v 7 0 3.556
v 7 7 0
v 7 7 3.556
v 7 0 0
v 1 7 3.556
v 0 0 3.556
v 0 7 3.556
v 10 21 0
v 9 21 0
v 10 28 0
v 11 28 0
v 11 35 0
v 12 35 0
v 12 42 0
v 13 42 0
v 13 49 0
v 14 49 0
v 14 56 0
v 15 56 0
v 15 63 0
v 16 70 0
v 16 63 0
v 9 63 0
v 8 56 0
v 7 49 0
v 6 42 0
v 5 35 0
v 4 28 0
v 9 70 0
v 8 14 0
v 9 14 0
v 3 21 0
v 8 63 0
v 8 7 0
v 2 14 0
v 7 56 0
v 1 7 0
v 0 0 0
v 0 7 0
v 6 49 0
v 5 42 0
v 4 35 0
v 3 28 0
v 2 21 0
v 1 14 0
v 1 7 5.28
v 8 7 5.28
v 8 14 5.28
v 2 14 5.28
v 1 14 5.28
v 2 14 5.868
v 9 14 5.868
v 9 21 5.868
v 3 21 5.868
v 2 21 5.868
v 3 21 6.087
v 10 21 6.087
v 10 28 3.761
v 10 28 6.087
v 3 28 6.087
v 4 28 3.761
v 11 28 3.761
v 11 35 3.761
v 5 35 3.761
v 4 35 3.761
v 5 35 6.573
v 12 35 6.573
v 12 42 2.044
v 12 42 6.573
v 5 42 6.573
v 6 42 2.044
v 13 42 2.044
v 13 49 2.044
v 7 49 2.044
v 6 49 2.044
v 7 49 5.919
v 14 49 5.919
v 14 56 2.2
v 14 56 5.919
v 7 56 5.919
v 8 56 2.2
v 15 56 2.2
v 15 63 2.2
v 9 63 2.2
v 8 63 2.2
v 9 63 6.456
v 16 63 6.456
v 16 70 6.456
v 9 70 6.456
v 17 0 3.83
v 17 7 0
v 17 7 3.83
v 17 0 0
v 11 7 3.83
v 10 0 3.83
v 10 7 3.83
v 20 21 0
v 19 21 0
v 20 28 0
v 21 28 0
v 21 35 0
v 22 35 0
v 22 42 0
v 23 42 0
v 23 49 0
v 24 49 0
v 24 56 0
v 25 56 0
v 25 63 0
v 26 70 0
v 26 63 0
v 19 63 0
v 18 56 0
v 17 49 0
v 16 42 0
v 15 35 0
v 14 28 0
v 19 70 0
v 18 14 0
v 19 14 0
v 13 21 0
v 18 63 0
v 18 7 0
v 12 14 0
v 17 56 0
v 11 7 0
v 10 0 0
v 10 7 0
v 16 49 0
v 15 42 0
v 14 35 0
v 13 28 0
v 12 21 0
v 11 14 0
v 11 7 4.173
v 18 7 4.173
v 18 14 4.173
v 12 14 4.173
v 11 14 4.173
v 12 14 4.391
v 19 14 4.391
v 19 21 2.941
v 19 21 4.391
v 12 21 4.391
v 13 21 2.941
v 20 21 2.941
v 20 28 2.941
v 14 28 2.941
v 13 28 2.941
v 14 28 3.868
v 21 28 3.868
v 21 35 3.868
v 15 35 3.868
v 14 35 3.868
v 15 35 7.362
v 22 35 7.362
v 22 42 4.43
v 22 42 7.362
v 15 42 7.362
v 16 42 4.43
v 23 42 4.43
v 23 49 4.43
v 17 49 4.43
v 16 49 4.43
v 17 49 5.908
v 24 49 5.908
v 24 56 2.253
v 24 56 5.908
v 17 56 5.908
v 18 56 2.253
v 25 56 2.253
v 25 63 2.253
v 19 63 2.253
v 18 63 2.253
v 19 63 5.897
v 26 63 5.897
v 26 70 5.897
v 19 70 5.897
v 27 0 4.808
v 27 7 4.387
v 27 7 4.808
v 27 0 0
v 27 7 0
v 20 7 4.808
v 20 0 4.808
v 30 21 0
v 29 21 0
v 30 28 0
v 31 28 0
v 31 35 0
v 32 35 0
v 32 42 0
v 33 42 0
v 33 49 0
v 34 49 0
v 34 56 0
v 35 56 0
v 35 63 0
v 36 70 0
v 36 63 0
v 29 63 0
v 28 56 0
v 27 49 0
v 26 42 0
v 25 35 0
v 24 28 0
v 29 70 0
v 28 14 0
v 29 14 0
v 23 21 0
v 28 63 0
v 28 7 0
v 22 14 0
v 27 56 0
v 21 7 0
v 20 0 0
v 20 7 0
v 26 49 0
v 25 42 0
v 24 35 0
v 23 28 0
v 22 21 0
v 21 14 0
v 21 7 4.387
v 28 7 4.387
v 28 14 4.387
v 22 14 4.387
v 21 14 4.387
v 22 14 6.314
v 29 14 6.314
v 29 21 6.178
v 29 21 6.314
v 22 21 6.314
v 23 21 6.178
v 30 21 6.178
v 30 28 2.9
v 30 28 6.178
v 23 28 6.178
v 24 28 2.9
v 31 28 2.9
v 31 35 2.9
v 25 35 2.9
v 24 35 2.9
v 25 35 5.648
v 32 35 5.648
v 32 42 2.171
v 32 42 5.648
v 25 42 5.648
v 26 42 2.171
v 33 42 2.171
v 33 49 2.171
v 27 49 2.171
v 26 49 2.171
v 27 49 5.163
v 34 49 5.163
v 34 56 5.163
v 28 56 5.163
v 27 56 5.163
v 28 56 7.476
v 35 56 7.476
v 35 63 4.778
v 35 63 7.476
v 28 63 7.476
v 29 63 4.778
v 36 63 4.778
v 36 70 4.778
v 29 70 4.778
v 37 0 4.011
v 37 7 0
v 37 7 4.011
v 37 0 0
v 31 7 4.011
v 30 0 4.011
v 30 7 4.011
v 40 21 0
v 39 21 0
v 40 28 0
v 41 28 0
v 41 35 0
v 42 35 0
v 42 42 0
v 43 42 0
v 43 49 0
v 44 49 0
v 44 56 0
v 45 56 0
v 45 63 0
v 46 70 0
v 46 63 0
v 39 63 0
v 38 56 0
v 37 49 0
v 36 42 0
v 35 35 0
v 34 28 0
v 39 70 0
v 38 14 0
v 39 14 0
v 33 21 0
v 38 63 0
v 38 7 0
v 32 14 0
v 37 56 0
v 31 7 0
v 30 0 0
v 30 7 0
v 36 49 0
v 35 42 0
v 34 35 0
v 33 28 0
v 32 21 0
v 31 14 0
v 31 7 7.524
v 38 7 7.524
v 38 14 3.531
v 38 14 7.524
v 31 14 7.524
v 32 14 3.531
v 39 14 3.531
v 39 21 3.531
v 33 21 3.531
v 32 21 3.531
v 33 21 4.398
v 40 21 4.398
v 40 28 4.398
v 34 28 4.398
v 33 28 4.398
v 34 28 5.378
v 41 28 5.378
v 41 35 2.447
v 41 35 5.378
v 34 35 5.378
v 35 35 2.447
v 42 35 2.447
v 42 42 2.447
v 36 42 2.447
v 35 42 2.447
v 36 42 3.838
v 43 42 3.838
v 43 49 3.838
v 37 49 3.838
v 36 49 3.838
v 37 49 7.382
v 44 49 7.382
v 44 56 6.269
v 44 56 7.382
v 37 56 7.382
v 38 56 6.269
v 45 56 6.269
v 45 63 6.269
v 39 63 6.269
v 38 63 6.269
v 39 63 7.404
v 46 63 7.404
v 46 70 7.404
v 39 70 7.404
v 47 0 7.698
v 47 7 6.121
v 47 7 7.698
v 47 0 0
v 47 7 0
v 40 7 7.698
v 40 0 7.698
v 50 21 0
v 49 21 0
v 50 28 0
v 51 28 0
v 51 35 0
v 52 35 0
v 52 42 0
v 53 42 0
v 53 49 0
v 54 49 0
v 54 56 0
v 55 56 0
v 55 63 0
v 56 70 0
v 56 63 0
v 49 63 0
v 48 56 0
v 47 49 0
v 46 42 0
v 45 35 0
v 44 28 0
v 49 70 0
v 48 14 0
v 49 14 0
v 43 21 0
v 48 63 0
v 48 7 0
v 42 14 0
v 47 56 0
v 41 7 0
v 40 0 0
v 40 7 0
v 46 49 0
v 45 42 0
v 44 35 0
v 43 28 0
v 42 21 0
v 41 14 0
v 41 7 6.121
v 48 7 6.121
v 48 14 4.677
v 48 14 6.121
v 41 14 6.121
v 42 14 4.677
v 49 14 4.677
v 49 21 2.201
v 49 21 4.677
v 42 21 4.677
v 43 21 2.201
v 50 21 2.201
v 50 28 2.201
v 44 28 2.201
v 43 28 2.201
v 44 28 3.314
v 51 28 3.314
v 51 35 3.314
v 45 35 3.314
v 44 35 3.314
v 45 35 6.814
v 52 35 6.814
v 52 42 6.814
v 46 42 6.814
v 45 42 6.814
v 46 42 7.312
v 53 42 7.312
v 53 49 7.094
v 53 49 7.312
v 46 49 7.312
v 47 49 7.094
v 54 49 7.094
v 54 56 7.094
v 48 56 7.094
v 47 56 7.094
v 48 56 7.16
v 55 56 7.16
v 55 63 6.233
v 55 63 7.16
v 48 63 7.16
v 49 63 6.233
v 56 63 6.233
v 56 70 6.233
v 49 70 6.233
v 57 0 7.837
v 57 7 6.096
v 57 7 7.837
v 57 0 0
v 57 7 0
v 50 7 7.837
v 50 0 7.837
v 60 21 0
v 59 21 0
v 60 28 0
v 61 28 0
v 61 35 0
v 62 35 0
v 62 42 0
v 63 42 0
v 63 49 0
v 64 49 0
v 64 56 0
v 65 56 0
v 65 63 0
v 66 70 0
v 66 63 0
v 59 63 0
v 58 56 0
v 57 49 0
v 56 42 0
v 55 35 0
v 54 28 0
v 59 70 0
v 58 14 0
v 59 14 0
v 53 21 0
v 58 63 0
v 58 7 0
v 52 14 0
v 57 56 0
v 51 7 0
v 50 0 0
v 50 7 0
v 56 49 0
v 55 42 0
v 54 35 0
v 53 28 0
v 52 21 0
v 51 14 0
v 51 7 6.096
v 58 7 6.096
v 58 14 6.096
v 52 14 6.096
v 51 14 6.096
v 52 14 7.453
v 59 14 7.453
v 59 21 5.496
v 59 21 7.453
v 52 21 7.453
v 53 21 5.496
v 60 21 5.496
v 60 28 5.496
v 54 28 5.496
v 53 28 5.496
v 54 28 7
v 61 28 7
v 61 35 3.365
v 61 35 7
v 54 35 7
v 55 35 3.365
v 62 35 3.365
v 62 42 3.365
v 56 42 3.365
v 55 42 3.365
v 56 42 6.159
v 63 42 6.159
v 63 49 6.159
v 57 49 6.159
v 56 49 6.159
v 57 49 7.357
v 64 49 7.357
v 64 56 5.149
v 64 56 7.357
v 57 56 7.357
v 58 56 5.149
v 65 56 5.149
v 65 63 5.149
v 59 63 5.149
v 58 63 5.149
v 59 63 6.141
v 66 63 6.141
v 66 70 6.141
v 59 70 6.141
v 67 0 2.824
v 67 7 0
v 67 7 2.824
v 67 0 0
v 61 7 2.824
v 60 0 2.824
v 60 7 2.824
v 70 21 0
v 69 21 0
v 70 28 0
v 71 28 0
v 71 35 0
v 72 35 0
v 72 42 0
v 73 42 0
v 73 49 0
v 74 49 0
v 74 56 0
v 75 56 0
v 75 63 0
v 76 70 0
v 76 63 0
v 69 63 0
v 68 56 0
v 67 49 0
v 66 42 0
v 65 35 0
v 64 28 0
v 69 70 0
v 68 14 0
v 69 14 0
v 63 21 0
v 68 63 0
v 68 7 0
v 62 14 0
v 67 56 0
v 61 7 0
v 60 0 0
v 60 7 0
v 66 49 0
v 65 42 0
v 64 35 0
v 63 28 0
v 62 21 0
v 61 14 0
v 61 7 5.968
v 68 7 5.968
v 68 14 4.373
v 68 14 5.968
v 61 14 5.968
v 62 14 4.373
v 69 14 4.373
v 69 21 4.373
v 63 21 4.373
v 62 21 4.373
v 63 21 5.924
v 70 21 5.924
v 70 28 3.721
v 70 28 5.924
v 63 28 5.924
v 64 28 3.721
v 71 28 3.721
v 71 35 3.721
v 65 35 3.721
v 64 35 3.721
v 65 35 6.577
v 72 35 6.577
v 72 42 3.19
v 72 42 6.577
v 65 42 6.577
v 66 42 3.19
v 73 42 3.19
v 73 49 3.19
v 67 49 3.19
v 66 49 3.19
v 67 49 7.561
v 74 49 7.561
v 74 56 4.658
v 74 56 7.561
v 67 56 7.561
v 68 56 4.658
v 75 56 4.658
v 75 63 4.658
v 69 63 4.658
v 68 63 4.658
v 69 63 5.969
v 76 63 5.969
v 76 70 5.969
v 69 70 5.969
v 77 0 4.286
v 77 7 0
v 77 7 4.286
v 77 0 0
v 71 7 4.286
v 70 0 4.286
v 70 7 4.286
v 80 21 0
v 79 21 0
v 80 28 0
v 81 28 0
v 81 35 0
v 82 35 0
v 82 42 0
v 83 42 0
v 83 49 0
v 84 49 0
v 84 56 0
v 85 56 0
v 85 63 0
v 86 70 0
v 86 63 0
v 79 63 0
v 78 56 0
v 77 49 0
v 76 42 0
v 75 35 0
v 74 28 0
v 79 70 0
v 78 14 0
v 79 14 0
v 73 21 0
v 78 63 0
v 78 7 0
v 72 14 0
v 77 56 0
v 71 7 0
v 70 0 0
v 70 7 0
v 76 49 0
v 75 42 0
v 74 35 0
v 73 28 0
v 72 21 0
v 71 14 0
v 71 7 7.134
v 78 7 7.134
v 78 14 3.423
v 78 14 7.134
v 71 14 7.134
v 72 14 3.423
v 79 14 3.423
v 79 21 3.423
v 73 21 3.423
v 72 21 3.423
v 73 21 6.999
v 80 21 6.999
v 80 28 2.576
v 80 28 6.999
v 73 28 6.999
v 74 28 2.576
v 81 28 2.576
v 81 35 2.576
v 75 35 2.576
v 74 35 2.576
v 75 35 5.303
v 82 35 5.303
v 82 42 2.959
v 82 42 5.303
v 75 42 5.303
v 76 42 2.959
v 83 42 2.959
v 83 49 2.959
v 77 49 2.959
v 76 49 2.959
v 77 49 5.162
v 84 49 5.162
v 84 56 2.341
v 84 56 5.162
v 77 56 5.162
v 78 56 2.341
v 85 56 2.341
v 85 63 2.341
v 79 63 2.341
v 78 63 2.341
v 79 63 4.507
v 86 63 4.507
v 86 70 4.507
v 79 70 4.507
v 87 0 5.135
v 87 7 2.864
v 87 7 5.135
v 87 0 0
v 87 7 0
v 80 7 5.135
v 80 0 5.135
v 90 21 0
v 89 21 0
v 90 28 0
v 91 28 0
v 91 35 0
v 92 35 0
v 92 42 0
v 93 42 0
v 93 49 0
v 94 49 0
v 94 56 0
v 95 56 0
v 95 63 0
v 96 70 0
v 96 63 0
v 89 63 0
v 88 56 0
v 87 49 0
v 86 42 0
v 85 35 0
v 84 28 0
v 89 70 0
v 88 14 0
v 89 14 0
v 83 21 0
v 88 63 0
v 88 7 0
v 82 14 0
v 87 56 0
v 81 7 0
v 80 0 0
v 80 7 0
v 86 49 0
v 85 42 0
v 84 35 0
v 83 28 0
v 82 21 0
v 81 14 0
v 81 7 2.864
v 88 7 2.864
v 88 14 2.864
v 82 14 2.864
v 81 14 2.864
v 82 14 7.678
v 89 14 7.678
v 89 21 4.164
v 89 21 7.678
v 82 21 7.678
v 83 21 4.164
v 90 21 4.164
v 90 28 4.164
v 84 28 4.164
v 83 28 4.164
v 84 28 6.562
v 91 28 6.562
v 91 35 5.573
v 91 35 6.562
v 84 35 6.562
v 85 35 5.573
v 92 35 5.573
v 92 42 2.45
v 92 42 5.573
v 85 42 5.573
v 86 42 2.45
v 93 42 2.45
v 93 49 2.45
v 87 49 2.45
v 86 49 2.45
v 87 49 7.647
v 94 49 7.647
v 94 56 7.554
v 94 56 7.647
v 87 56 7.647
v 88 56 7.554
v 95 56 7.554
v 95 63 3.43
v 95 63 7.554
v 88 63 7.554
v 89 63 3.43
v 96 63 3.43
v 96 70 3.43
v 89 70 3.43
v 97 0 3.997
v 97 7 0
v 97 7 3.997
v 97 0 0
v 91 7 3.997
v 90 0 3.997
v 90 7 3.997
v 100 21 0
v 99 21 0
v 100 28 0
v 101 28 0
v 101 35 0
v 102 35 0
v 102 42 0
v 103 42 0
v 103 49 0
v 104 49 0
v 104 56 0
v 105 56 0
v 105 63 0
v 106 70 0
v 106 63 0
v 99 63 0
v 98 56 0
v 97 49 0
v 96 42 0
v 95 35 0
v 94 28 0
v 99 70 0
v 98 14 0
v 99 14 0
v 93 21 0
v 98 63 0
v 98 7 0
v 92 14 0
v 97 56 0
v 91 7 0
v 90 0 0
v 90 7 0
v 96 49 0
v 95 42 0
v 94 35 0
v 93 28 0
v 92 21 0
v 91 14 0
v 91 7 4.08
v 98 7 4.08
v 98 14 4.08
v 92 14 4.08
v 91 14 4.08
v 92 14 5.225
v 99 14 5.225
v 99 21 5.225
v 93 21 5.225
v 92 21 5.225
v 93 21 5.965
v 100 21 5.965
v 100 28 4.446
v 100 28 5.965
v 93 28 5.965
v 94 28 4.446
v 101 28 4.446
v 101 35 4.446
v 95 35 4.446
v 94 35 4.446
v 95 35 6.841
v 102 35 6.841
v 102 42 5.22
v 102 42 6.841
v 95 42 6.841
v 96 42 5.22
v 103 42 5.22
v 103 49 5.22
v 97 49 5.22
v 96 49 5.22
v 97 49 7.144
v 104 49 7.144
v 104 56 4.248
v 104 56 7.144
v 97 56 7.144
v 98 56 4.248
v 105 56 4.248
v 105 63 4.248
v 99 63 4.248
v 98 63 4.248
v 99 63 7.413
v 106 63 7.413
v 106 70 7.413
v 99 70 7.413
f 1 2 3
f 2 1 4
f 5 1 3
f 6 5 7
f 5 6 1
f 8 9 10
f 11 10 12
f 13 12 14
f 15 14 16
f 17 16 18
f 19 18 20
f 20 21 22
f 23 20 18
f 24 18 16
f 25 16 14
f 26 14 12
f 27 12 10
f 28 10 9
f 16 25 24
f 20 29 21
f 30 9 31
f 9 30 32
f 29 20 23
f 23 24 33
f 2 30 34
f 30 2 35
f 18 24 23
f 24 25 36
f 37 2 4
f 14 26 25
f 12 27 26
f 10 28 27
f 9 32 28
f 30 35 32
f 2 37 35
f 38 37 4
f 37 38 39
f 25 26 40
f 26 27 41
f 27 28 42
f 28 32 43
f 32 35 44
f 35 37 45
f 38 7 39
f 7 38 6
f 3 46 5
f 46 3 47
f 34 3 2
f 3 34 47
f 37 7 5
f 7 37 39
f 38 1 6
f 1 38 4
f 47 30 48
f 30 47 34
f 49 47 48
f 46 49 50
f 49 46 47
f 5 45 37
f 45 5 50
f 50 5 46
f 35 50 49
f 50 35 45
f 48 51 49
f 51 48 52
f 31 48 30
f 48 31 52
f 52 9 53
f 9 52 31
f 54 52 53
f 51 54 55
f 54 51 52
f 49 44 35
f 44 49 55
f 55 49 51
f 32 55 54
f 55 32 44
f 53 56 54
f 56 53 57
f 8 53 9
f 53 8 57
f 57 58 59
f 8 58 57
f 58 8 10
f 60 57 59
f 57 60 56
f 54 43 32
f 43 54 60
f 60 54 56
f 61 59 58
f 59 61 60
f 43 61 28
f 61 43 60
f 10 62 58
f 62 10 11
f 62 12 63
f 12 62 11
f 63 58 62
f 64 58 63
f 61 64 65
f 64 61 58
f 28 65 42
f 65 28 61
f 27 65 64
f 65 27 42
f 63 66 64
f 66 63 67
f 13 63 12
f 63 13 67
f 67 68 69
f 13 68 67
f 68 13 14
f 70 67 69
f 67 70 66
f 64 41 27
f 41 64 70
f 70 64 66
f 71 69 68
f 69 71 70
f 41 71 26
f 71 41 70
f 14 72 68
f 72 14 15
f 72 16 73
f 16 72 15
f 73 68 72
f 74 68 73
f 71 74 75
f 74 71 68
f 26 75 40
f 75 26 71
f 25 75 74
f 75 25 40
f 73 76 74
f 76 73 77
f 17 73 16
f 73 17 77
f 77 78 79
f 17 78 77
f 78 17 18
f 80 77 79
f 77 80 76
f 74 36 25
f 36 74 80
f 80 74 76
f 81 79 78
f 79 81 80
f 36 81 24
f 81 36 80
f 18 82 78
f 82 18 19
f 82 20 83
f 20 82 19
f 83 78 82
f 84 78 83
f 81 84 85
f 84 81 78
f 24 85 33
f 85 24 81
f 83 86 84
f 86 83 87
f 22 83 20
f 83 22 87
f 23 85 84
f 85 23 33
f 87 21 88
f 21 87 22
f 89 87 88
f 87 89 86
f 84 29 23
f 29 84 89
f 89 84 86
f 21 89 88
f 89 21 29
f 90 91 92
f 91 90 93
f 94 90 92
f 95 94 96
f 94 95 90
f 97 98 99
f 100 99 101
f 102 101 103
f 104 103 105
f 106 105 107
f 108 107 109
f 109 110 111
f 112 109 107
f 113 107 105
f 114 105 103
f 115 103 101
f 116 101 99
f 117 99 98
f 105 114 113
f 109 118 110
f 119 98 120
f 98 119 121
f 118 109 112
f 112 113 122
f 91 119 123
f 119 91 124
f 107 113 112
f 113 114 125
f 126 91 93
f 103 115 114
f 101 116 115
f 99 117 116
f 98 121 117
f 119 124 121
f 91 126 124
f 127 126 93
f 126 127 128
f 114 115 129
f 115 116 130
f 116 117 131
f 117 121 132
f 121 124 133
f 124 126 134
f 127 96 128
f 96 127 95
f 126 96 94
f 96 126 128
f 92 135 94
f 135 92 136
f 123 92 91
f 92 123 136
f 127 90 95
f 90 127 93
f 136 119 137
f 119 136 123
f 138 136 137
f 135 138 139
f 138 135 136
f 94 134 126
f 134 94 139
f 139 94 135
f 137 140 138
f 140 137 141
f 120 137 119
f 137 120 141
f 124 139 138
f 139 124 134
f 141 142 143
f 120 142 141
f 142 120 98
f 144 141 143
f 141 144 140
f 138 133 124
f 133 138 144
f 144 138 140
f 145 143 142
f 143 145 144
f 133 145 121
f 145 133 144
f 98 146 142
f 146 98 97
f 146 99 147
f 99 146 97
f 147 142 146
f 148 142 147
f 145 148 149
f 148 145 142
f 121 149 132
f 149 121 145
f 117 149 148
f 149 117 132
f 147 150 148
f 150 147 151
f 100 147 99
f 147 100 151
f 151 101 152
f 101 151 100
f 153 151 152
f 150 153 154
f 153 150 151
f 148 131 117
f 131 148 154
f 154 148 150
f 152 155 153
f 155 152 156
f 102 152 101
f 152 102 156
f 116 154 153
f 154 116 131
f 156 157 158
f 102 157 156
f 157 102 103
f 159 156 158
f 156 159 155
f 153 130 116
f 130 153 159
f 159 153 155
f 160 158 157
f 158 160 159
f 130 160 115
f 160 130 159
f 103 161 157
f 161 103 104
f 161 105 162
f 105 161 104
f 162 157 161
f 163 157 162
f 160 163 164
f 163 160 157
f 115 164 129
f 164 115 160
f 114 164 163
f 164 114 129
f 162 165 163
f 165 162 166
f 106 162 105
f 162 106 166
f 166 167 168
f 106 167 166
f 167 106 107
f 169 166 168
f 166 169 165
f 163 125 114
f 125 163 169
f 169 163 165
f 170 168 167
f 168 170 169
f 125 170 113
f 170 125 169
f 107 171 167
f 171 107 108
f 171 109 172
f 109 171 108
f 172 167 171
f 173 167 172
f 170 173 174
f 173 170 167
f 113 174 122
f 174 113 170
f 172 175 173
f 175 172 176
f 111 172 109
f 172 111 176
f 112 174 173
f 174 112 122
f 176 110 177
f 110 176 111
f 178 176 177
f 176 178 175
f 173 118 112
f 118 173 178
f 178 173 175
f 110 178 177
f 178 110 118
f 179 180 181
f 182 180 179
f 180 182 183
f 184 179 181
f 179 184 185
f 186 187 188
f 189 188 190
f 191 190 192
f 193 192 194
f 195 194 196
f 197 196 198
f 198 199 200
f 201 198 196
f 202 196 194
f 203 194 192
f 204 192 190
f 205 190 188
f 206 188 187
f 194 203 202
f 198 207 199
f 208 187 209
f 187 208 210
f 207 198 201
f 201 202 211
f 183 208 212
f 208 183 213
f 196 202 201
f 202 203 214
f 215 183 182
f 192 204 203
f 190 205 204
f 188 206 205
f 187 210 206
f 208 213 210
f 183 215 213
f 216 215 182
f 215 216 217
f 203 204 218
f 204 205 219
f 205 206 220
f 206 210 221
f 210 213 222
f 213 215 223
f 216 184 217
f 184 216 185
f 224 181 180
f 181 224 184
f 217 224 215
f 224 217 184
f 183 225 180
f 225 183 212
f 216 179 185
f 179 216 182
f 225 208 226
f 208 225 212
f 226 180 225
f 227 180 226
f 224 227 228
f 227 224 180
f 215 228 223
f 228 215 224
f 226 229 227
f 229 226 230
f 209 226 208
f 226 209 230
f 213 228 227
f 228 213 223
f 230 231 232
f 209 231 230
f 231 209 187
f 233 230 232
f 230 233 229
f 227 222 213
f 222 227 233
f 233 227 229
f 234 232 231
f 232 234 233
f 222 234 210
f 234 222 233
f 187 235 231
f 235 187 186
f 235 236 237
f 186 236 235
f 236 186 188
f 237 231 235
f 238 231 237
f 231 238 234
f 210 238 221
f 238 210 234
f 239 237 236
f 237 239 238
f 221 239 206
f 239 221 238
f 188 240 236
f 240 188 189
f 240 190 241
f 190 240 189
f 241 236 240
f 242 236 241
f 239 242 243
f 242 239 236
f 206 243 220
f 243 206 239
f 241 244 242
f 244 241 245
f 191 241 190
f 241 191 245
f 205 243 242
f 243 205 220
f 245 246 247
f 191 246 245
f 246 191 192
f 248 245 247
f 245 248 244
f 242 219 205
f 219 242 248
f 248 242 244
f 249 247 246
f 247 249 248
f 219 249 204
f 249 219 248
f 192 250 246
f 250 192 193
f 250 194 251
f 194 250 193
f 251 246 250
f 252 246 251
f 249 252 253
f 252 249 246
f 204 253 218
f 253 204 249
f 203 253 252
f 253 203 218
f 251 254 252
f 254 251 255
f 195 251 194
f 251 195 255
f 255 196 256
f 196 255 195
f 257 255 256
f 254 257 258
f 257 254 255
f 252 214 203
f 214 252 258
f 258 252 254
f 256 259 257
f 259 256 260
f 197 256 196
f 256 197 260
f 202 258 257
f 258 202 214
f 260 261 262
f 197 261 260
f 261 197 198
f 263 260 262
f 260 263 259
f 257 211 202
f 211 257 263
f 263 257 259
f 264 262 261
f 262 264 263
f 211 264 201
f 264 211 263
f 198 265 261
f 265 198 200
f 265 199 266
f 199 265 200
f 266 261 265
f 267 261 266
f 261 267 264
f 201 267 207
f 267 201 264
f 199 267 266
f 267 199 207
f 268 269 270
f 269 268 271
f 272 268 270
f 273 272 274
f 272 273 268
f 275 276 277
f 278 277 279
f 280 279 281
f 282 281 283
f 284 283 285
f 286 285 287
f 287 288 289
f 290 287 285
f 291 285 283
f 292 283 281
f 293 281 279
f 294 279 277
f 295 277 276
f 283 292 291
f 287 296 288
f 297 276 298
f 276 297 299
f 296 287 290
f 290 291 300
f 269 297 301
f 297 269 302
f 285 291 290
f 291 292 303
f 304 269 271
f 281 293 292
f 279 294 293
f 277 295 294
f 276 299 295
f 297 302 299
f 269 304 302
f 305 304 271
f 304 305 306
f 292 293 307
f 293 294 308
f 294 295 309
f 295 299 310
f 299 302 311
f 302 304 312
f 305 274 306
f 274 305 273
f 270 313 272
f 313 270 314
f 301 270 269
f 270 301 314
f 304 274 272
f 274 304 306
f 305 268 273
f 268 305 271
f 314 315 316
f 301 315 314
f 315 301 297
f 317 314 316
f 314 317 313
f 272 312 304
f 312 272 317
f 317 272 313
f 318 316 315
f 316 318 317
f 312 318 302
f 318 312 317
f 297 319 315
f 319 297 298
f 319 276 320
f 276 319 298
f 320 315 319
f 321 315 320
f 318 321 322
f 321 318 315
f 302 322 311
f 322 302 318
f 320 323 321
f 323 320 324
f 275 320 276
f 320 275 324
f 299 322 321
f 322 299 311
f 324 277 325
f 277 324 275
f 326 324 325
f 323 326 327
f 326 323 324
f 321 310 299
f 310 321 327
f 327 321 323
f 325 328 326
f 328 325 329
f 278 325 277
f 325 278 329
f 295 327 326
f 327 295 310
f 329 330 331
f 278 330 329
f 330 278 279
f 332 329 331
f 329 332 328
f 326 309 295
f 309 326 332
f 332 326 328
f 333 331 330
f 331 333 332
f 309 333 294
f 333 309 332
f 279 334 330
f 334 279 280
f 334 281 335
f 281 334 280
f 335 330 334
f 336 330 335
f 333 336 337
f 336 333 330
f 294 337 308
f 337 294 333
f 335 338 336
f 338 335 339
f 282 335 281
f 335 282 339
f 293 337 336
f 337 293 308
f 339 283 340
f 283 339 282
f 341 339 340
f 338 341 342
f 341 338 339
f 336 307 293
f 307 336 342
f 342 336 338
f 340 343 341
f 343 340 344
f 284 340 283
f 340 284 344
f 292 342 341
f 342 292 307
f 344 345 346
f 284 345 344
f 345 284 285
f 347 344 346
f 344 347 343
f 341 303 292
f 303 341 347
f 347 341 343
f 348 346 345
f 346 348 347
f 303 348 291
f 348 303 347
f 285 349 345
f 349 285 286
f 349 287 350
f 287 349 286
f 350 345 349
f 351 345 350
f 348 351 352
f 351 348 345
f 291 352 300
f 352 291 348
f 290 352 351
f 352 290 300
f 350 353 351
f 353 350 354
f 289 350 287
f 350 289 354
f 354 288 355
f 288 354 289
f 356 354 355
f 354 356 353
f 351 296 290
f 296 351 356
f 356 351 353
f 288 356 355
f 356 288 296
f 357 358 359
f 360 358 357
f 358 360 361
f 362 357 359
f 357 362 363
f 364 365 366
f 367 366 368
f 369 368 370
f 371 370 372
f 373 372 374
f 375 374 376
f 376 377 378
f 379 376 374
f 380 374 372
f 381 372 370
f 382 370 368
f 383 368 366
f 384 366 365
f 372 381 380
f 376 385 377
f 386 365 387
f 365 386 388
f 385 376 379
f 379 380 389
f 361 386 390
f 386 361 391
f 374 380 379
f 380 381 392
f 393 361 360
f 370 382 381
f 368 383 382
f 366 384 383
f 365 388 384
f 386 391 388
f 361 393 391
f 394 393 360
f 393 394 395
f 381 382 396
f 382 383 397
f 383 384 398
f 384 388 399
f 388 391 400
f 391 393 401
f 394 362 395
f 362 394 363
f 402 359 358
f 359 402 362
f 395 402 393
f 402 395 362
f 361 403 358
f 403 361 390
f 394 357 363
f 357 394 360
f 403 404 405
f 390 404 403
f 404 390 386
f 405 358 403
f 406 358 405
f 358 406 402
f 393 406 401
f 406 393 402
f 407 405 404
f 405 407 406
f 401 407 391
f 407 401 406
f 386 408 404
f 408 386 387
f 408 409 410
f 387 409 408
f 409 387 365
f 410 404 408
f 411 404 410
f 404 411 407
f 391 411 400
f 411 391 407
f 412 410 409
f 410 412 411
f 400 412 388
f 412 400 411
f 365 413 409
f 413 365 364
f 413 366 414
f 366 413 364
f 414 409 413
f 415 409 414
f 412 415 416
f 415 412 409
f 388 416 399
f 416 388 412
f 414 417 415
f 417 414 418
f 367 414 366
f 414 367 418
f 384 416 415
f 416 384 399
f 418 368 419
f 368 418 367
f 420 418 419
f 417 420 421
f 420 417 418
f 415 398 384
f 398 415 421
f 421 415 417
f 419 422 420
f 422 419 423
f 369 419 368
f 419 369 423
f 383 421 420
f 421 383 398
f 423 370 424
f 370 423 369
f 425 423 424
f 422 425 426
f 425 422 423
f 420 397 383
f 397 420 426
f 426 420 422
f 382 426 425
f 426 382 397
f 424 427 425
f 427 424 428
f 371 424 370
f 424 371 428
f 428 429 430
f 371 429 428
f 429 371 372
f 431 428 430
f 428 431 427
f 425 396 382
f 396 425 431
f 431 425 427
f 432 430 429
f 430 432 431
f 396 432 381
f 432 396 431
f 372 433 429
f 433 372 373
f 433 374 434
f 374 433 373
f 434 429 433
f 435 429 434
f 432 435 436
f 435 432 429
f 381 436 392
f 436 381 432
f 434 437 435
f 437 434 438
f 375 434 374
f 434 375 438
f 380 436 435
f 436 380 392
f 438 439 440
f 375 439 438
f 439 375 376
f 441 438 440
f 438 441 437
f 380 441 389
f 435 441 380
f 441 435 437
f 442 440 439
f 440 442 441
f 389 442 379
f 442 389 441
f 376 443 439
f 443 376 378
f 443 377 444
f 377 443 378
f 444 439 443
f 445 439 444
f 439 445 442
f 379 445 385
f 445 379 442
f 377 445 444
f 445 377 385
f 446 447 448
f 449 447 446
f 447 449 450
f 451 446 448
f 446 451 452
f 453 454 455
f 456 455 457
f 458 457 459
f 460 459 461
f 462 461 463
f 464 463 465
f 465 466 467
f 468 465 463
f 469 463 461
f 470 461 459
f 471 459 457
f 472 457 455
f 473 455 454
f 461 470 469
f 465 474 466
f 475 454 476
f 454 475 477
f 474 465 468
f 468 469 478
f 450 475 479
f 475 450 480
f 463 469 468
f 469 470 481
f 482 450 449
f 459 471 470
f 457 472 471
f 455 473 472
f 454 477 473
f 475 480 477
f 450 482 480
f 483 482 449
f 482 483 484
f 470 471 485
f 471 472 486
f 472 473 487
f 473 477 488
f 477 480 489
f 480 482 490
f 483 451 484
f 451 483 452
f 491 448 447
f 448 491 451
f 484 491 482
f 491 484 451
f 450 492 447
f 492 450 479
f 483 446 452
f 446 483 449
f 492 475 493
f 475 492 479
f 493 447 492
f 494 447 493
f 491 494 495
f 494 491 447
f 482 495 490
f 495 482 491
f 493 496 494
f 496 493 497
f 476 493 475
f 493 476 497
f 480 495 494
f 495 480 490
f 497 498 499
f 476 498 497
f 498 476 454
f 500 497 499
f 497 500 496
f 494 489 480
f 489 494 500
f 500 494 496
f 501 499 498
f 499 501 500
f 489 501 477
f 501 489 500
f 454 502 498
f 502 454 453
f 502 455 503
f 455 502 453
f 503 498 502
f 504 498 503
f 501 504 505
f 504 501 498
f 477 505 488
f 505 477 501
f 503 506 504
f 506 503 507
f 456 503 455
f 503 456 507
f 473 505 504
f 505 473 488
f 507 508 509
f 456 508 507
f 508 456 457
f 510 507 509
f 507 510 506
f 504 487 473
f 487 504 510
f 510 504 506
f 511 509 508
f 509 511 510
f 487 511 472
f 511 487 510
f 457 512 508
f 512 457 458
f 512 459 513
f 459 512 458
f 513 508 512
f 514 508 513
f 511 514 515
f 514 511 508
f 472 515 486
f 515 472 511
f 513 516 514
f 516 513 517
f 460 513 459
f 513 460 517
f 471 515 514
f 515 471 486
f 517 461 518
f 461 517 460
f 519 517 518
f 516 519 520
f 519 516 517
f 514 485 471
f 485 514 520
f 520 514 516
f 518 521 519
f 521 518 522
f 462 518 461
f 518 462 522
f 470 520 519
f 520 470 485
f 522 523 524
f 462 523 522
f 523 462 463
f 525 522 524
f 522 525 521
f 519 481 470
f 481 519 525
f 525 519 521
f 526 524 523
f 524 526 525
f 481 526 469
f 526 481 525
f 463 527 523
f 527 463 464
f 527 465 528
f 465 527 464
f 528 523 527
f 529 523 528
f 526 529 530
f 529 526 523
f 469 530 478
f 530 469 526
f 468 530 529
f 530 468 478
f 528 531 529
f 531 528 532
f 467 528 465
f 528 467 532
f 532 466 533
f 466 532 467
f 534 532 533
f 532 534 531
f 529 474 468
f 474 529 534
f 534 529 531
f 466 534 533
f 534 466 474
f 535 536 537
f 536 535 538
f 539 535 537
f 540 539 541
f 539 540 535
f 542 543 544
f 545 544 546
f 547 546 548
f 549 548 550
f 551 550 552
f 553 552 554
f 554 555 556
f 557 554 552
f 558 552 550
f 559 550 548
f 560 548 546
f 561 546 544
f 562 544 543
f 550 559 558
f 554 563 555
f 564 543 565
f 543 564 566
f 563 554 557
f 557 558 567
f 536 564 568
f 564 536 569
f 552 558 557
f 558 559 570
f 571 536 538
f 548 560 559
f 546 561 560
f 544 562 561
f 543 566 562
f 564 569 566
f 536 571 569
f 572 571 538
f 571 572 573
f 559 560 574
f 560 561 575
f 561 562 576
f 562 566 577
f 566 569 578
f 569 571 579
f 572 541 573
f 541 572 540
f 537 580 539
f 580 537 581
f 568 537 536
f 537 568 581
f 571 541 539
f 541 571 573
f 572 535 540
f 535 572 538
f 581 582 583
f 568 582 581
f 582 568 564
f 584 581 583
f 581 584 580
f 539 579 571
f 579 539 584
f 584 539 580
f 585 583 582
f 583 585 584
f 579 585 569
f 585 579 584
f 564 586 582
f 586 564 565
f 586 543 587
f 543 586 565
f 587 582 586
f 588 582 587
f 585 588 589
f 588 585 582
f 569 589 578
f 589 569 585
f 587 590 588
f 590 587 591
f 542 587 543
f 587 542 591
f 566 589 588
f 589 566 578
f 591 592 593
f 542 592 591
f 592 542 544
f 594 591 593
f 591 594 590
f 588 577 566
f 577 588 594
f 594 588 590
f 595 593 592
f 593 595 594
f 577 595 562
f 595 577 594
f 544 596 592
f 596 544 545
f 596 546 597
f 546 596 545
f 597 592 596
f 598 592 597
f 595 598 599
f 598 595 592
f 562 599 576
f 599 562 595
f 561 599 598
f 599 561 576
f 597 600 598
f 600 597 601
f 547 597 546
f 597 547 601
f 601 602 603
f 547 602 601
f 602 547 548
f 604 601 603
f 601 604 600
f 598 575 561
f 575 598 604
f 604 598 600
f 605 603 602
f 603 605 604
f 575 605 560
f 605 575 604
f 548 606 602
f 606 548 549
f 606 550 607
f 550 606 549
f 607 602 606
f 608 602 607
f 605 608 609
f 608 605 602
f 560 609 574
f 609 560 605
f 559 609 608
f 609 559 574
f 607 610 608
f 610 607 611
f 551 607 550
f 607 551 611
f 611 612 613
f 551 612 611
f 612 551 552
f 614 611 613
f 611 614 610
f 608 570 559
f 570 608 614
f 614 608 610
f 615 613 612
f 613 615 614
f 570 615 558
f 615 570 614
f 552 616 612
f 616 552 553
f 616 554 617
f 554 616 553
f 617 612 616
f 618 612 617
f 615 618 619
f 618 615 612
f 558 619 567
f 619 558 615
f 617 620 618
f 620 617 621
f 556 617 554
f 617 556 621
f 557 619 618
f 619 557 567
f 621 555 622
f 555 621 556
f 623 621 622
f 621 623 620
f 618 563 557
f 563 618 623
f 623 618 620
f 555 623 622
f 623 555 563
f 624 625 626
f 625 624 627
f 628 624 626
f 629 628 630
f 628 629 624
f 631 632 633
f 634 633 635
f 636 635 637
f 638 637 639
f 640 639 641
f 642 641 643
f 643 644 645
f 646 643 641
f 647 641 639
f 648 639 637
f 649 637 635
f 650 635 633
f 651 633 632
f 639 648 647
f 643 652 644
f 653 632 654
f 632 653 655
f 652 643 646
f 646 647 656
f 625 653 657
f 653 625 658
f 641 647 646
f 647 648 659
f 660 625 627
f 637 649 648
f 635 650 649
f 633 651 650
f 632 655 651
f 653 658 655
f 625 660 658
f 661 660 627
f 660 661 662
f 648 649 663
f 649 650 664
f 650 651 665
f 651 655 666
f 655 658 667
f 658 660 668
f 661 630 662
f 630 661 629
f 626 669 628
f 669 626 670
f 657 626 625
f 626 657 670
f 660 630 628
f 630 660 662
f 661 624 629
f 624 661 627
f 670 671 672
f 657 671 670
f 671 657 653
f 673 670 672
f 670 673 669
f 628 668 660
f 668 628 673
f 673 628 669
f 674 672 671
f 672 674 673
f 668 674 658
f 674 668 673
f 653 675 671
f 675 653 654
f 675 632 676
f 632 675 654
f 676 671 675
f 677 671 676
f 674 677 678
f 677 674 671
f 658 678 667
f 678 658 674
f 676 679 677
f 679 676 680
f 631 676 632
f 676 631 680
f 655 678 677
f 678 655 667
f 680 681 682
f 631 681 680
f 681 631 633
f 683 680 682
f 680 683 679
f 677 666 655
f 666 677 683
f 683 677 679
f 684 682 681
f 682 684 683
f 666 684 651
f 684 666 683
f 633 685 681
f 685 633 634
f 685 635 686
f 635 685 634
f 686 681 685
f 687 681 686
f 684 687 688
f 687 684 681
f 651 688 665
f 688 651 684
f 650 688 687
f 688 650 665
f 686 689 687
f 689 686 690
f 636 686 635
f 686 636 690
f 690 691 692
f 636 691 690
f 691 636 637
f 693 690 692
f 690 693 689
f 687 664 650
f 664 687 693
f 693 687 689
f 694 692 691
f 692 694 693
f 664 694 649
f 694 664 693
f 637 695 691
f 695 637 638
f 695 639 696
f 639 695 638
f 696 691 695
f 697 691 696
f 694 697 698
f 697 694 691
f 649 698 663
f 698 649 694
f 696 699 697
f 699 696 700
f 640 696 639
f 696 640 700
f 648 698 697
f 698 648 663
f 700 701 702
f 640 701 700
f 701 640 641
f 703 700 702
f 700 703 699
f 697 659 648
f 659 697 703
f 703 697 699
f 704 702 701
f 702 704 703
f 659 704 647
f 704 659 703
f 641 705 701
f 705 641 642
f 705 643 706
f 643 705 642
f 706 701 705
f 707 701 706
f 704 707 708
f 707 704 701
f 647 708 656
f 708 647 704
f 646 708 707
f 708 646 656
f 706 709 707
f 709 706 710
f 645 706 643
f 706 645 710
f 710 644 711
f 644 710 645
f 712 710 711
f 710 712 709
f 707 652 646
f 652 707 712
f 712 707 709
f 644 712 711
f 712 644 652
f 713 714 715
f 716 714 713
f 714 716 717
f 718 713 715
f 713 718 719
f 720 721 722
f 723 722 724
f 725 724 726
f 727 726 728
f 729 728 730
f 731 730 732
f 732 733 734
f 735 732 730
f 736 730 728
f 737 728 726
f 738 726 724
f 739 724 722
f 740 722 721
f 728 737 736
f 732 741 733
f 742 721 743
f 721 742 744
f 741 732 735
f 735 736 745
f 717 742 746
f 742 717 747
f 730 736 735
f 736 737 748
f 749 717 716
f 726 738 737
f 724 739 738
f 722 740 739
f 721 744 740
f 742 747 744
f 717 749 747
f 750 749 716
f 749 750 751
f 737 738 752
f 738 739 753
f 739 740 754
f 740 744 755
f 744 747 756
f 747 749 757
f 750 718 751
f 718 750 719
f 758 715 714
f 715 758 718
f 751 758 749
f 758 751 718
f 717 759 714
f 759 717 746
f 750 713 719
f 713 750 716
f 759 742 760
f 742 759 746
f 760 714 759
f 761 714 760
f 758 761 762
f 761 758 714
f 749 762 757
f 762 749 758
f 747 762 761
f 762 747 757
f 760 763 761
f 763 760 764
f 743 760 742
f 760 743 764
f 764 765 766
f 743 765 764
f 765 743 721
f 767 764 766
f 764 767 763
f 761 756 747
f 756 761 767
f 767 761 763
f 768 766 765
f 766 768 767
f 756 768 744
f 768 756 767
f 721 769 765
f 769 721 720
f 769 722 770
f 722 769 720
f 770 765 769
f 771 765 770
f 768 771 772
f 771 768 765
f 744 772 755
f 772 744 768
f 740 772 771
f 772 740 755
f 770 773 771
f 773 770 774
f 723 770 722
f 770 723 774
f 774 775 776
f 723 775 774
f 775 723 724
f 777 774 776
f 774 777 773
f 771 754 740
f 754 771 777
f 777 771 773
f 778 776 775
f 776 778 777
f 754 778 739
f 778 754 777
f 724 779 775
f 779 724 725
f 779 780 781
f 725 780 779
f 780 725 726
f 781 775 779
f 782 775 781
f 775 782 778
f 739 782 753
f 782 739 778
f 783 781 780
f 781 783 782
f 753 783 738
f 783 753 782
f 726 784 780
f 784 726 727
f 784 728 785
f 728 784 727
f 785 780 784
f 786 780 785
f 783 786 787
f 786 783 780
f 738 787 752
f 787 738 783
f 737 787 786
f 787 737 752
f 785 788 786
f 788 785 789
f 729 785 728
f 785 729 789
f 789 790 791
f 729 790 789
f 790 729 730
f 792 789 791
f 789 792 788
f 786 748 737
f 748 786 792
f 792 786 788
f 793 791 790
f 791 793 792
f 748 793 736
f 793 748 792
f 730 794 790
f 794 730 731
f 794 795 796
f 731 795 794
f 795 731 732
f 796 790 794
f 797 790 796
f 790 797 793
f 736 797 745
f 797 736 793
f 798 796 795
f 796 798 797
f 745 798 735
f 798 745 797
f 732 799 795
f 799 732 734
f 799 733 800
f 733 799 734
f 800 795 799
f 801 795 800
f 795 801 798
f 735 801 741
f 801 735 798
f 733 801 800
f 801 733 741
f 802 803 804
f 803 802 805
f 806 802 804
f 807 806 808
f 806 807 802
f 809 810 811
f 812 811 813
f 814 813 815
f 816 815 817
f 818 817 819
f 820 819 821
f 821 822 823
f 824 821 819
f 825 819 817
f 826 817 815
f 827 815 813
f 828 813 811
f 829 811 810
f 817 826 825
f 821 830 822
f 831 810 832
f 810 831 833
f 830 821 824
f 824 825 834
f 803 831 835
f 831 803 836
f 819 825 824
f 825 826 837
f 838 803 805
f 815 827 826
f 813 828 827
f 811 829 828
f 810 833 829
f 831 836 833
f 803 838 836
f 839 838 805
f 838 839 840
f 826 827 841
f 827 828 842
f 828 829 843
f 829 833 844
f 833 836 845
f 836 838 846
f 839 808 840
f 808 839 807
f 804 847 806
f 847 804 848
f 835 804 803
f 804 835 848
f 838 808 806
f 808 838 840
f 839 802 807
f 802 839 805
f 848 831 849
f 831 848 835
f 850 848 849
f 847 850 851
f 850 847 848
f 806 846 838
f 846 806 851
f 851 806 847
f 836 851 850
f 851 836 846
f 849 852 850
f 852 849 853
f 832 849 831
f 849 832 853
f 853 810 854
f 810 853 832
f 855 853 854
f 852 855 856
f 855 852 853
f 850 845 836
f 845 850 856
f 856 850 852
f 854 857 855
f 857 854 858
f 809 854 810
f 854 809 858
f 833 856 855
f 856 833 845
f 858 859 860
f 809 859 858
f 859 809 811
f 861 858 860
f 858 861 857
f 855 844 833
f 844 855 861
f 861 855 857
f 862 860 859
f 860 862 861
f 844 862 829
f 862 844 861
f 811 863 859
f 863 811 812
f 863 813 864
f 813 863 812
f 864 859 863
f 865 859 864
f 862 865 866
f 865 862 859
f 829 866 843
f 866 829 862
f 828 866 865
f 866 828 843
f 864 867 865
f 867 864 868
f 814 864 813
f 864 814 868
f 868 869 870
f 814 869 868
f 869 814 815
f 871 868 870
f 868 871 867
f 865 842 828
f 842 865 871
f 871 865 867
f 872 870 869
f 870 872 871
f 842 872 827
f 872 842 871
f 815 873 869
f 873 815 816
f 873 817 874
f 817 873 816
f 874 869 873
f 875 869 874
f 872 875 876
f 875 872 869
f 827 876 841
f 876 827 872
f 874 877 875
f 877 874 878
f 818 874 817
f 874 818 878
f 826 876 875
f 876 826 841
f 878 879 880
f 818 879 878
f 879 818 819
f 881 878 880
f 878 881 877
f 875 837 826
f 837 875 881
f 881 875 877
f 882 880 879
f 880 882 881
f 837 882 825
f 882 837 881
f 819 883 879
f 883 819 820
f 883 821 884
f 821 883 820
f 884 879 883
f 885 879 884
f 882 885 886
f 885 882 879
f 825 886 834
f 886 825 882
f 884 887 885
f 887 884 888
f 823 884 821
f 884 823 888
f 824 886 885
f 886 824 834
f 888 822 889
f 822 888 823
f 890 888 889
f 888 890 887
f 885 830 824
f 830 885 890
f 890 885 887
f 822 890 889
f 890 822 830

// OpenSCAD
width = 70;
divisions = 10;
min_height = 2;
max_height = 8;

number_of_blocks = divisions * divisions;

module panel()
{
	heights = rands(min_height, max_height, number_of_blocks);
	division_width = width / divisions;

	for (i = [0:number_of_blocks - 1])
	{
		row = i % divisions;
		translate([ i, row * division_width, 0 ])
		cube([ division_width, division_width, heights[i] ]);
	}
}

panel();
